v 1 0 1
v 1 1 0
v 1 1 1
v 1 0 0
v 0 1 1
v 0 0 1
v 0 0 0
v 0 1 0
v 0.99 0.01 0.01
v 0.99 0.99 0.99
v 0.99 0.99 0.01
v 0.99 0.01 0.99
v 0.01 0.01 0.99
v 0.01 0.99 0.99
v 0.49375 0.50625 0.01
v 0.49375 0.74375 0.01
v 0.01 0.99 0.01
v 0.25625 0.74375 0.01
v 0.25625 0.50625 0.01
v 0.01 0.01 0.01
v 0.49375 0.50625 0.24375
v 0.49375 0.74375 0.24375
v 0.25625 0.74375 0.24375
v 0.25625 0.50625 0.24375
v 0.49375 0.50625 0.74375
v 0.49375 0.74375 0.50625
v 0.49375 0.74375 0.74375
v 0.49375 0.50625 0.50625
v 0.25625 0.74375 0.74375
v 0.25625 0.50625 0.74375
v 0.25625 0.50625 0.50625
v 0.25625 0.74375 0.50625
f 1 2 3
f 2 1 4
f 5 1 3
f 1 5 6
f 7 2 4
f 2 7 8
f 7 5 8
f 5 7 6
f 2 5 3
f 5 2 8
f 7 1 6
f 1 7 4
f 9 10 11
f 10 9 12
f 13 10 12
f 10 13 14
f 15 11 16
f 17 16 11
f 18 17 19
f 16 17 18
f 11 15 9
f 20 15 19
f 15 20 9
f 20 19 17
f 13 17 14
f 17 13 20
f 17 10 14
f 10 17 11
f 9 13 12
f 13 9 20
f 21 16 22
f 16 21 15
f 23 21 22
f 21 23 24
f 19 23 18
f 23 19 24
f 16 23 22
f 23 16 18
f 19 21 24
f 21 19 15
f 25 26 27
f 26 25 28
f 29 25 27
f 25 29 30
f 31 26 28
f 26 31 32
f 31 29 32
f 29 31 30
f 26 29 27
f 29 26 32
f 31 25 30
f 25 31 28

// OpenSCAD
translate([0.375, 0.625, 0.125]) color([0.3403487699834433, 0.7817731397512809, 0.9743292711922114]) cube([0.2375, 0.2375, 0.2375], center=true);
translate([0.375, 0.625, 0.625]) color([0.5879067123776442, 0.7644126763156446, 0.4000601250473008]) cube([0.2375, 0.2375, 0.2375], center=true);
color([0.3,0.3,0.3,0.3]) difference() { cube([1,1,1]); translate([0.01,0.01,0.01]) cube([0.98,0.98,0.98]); }
